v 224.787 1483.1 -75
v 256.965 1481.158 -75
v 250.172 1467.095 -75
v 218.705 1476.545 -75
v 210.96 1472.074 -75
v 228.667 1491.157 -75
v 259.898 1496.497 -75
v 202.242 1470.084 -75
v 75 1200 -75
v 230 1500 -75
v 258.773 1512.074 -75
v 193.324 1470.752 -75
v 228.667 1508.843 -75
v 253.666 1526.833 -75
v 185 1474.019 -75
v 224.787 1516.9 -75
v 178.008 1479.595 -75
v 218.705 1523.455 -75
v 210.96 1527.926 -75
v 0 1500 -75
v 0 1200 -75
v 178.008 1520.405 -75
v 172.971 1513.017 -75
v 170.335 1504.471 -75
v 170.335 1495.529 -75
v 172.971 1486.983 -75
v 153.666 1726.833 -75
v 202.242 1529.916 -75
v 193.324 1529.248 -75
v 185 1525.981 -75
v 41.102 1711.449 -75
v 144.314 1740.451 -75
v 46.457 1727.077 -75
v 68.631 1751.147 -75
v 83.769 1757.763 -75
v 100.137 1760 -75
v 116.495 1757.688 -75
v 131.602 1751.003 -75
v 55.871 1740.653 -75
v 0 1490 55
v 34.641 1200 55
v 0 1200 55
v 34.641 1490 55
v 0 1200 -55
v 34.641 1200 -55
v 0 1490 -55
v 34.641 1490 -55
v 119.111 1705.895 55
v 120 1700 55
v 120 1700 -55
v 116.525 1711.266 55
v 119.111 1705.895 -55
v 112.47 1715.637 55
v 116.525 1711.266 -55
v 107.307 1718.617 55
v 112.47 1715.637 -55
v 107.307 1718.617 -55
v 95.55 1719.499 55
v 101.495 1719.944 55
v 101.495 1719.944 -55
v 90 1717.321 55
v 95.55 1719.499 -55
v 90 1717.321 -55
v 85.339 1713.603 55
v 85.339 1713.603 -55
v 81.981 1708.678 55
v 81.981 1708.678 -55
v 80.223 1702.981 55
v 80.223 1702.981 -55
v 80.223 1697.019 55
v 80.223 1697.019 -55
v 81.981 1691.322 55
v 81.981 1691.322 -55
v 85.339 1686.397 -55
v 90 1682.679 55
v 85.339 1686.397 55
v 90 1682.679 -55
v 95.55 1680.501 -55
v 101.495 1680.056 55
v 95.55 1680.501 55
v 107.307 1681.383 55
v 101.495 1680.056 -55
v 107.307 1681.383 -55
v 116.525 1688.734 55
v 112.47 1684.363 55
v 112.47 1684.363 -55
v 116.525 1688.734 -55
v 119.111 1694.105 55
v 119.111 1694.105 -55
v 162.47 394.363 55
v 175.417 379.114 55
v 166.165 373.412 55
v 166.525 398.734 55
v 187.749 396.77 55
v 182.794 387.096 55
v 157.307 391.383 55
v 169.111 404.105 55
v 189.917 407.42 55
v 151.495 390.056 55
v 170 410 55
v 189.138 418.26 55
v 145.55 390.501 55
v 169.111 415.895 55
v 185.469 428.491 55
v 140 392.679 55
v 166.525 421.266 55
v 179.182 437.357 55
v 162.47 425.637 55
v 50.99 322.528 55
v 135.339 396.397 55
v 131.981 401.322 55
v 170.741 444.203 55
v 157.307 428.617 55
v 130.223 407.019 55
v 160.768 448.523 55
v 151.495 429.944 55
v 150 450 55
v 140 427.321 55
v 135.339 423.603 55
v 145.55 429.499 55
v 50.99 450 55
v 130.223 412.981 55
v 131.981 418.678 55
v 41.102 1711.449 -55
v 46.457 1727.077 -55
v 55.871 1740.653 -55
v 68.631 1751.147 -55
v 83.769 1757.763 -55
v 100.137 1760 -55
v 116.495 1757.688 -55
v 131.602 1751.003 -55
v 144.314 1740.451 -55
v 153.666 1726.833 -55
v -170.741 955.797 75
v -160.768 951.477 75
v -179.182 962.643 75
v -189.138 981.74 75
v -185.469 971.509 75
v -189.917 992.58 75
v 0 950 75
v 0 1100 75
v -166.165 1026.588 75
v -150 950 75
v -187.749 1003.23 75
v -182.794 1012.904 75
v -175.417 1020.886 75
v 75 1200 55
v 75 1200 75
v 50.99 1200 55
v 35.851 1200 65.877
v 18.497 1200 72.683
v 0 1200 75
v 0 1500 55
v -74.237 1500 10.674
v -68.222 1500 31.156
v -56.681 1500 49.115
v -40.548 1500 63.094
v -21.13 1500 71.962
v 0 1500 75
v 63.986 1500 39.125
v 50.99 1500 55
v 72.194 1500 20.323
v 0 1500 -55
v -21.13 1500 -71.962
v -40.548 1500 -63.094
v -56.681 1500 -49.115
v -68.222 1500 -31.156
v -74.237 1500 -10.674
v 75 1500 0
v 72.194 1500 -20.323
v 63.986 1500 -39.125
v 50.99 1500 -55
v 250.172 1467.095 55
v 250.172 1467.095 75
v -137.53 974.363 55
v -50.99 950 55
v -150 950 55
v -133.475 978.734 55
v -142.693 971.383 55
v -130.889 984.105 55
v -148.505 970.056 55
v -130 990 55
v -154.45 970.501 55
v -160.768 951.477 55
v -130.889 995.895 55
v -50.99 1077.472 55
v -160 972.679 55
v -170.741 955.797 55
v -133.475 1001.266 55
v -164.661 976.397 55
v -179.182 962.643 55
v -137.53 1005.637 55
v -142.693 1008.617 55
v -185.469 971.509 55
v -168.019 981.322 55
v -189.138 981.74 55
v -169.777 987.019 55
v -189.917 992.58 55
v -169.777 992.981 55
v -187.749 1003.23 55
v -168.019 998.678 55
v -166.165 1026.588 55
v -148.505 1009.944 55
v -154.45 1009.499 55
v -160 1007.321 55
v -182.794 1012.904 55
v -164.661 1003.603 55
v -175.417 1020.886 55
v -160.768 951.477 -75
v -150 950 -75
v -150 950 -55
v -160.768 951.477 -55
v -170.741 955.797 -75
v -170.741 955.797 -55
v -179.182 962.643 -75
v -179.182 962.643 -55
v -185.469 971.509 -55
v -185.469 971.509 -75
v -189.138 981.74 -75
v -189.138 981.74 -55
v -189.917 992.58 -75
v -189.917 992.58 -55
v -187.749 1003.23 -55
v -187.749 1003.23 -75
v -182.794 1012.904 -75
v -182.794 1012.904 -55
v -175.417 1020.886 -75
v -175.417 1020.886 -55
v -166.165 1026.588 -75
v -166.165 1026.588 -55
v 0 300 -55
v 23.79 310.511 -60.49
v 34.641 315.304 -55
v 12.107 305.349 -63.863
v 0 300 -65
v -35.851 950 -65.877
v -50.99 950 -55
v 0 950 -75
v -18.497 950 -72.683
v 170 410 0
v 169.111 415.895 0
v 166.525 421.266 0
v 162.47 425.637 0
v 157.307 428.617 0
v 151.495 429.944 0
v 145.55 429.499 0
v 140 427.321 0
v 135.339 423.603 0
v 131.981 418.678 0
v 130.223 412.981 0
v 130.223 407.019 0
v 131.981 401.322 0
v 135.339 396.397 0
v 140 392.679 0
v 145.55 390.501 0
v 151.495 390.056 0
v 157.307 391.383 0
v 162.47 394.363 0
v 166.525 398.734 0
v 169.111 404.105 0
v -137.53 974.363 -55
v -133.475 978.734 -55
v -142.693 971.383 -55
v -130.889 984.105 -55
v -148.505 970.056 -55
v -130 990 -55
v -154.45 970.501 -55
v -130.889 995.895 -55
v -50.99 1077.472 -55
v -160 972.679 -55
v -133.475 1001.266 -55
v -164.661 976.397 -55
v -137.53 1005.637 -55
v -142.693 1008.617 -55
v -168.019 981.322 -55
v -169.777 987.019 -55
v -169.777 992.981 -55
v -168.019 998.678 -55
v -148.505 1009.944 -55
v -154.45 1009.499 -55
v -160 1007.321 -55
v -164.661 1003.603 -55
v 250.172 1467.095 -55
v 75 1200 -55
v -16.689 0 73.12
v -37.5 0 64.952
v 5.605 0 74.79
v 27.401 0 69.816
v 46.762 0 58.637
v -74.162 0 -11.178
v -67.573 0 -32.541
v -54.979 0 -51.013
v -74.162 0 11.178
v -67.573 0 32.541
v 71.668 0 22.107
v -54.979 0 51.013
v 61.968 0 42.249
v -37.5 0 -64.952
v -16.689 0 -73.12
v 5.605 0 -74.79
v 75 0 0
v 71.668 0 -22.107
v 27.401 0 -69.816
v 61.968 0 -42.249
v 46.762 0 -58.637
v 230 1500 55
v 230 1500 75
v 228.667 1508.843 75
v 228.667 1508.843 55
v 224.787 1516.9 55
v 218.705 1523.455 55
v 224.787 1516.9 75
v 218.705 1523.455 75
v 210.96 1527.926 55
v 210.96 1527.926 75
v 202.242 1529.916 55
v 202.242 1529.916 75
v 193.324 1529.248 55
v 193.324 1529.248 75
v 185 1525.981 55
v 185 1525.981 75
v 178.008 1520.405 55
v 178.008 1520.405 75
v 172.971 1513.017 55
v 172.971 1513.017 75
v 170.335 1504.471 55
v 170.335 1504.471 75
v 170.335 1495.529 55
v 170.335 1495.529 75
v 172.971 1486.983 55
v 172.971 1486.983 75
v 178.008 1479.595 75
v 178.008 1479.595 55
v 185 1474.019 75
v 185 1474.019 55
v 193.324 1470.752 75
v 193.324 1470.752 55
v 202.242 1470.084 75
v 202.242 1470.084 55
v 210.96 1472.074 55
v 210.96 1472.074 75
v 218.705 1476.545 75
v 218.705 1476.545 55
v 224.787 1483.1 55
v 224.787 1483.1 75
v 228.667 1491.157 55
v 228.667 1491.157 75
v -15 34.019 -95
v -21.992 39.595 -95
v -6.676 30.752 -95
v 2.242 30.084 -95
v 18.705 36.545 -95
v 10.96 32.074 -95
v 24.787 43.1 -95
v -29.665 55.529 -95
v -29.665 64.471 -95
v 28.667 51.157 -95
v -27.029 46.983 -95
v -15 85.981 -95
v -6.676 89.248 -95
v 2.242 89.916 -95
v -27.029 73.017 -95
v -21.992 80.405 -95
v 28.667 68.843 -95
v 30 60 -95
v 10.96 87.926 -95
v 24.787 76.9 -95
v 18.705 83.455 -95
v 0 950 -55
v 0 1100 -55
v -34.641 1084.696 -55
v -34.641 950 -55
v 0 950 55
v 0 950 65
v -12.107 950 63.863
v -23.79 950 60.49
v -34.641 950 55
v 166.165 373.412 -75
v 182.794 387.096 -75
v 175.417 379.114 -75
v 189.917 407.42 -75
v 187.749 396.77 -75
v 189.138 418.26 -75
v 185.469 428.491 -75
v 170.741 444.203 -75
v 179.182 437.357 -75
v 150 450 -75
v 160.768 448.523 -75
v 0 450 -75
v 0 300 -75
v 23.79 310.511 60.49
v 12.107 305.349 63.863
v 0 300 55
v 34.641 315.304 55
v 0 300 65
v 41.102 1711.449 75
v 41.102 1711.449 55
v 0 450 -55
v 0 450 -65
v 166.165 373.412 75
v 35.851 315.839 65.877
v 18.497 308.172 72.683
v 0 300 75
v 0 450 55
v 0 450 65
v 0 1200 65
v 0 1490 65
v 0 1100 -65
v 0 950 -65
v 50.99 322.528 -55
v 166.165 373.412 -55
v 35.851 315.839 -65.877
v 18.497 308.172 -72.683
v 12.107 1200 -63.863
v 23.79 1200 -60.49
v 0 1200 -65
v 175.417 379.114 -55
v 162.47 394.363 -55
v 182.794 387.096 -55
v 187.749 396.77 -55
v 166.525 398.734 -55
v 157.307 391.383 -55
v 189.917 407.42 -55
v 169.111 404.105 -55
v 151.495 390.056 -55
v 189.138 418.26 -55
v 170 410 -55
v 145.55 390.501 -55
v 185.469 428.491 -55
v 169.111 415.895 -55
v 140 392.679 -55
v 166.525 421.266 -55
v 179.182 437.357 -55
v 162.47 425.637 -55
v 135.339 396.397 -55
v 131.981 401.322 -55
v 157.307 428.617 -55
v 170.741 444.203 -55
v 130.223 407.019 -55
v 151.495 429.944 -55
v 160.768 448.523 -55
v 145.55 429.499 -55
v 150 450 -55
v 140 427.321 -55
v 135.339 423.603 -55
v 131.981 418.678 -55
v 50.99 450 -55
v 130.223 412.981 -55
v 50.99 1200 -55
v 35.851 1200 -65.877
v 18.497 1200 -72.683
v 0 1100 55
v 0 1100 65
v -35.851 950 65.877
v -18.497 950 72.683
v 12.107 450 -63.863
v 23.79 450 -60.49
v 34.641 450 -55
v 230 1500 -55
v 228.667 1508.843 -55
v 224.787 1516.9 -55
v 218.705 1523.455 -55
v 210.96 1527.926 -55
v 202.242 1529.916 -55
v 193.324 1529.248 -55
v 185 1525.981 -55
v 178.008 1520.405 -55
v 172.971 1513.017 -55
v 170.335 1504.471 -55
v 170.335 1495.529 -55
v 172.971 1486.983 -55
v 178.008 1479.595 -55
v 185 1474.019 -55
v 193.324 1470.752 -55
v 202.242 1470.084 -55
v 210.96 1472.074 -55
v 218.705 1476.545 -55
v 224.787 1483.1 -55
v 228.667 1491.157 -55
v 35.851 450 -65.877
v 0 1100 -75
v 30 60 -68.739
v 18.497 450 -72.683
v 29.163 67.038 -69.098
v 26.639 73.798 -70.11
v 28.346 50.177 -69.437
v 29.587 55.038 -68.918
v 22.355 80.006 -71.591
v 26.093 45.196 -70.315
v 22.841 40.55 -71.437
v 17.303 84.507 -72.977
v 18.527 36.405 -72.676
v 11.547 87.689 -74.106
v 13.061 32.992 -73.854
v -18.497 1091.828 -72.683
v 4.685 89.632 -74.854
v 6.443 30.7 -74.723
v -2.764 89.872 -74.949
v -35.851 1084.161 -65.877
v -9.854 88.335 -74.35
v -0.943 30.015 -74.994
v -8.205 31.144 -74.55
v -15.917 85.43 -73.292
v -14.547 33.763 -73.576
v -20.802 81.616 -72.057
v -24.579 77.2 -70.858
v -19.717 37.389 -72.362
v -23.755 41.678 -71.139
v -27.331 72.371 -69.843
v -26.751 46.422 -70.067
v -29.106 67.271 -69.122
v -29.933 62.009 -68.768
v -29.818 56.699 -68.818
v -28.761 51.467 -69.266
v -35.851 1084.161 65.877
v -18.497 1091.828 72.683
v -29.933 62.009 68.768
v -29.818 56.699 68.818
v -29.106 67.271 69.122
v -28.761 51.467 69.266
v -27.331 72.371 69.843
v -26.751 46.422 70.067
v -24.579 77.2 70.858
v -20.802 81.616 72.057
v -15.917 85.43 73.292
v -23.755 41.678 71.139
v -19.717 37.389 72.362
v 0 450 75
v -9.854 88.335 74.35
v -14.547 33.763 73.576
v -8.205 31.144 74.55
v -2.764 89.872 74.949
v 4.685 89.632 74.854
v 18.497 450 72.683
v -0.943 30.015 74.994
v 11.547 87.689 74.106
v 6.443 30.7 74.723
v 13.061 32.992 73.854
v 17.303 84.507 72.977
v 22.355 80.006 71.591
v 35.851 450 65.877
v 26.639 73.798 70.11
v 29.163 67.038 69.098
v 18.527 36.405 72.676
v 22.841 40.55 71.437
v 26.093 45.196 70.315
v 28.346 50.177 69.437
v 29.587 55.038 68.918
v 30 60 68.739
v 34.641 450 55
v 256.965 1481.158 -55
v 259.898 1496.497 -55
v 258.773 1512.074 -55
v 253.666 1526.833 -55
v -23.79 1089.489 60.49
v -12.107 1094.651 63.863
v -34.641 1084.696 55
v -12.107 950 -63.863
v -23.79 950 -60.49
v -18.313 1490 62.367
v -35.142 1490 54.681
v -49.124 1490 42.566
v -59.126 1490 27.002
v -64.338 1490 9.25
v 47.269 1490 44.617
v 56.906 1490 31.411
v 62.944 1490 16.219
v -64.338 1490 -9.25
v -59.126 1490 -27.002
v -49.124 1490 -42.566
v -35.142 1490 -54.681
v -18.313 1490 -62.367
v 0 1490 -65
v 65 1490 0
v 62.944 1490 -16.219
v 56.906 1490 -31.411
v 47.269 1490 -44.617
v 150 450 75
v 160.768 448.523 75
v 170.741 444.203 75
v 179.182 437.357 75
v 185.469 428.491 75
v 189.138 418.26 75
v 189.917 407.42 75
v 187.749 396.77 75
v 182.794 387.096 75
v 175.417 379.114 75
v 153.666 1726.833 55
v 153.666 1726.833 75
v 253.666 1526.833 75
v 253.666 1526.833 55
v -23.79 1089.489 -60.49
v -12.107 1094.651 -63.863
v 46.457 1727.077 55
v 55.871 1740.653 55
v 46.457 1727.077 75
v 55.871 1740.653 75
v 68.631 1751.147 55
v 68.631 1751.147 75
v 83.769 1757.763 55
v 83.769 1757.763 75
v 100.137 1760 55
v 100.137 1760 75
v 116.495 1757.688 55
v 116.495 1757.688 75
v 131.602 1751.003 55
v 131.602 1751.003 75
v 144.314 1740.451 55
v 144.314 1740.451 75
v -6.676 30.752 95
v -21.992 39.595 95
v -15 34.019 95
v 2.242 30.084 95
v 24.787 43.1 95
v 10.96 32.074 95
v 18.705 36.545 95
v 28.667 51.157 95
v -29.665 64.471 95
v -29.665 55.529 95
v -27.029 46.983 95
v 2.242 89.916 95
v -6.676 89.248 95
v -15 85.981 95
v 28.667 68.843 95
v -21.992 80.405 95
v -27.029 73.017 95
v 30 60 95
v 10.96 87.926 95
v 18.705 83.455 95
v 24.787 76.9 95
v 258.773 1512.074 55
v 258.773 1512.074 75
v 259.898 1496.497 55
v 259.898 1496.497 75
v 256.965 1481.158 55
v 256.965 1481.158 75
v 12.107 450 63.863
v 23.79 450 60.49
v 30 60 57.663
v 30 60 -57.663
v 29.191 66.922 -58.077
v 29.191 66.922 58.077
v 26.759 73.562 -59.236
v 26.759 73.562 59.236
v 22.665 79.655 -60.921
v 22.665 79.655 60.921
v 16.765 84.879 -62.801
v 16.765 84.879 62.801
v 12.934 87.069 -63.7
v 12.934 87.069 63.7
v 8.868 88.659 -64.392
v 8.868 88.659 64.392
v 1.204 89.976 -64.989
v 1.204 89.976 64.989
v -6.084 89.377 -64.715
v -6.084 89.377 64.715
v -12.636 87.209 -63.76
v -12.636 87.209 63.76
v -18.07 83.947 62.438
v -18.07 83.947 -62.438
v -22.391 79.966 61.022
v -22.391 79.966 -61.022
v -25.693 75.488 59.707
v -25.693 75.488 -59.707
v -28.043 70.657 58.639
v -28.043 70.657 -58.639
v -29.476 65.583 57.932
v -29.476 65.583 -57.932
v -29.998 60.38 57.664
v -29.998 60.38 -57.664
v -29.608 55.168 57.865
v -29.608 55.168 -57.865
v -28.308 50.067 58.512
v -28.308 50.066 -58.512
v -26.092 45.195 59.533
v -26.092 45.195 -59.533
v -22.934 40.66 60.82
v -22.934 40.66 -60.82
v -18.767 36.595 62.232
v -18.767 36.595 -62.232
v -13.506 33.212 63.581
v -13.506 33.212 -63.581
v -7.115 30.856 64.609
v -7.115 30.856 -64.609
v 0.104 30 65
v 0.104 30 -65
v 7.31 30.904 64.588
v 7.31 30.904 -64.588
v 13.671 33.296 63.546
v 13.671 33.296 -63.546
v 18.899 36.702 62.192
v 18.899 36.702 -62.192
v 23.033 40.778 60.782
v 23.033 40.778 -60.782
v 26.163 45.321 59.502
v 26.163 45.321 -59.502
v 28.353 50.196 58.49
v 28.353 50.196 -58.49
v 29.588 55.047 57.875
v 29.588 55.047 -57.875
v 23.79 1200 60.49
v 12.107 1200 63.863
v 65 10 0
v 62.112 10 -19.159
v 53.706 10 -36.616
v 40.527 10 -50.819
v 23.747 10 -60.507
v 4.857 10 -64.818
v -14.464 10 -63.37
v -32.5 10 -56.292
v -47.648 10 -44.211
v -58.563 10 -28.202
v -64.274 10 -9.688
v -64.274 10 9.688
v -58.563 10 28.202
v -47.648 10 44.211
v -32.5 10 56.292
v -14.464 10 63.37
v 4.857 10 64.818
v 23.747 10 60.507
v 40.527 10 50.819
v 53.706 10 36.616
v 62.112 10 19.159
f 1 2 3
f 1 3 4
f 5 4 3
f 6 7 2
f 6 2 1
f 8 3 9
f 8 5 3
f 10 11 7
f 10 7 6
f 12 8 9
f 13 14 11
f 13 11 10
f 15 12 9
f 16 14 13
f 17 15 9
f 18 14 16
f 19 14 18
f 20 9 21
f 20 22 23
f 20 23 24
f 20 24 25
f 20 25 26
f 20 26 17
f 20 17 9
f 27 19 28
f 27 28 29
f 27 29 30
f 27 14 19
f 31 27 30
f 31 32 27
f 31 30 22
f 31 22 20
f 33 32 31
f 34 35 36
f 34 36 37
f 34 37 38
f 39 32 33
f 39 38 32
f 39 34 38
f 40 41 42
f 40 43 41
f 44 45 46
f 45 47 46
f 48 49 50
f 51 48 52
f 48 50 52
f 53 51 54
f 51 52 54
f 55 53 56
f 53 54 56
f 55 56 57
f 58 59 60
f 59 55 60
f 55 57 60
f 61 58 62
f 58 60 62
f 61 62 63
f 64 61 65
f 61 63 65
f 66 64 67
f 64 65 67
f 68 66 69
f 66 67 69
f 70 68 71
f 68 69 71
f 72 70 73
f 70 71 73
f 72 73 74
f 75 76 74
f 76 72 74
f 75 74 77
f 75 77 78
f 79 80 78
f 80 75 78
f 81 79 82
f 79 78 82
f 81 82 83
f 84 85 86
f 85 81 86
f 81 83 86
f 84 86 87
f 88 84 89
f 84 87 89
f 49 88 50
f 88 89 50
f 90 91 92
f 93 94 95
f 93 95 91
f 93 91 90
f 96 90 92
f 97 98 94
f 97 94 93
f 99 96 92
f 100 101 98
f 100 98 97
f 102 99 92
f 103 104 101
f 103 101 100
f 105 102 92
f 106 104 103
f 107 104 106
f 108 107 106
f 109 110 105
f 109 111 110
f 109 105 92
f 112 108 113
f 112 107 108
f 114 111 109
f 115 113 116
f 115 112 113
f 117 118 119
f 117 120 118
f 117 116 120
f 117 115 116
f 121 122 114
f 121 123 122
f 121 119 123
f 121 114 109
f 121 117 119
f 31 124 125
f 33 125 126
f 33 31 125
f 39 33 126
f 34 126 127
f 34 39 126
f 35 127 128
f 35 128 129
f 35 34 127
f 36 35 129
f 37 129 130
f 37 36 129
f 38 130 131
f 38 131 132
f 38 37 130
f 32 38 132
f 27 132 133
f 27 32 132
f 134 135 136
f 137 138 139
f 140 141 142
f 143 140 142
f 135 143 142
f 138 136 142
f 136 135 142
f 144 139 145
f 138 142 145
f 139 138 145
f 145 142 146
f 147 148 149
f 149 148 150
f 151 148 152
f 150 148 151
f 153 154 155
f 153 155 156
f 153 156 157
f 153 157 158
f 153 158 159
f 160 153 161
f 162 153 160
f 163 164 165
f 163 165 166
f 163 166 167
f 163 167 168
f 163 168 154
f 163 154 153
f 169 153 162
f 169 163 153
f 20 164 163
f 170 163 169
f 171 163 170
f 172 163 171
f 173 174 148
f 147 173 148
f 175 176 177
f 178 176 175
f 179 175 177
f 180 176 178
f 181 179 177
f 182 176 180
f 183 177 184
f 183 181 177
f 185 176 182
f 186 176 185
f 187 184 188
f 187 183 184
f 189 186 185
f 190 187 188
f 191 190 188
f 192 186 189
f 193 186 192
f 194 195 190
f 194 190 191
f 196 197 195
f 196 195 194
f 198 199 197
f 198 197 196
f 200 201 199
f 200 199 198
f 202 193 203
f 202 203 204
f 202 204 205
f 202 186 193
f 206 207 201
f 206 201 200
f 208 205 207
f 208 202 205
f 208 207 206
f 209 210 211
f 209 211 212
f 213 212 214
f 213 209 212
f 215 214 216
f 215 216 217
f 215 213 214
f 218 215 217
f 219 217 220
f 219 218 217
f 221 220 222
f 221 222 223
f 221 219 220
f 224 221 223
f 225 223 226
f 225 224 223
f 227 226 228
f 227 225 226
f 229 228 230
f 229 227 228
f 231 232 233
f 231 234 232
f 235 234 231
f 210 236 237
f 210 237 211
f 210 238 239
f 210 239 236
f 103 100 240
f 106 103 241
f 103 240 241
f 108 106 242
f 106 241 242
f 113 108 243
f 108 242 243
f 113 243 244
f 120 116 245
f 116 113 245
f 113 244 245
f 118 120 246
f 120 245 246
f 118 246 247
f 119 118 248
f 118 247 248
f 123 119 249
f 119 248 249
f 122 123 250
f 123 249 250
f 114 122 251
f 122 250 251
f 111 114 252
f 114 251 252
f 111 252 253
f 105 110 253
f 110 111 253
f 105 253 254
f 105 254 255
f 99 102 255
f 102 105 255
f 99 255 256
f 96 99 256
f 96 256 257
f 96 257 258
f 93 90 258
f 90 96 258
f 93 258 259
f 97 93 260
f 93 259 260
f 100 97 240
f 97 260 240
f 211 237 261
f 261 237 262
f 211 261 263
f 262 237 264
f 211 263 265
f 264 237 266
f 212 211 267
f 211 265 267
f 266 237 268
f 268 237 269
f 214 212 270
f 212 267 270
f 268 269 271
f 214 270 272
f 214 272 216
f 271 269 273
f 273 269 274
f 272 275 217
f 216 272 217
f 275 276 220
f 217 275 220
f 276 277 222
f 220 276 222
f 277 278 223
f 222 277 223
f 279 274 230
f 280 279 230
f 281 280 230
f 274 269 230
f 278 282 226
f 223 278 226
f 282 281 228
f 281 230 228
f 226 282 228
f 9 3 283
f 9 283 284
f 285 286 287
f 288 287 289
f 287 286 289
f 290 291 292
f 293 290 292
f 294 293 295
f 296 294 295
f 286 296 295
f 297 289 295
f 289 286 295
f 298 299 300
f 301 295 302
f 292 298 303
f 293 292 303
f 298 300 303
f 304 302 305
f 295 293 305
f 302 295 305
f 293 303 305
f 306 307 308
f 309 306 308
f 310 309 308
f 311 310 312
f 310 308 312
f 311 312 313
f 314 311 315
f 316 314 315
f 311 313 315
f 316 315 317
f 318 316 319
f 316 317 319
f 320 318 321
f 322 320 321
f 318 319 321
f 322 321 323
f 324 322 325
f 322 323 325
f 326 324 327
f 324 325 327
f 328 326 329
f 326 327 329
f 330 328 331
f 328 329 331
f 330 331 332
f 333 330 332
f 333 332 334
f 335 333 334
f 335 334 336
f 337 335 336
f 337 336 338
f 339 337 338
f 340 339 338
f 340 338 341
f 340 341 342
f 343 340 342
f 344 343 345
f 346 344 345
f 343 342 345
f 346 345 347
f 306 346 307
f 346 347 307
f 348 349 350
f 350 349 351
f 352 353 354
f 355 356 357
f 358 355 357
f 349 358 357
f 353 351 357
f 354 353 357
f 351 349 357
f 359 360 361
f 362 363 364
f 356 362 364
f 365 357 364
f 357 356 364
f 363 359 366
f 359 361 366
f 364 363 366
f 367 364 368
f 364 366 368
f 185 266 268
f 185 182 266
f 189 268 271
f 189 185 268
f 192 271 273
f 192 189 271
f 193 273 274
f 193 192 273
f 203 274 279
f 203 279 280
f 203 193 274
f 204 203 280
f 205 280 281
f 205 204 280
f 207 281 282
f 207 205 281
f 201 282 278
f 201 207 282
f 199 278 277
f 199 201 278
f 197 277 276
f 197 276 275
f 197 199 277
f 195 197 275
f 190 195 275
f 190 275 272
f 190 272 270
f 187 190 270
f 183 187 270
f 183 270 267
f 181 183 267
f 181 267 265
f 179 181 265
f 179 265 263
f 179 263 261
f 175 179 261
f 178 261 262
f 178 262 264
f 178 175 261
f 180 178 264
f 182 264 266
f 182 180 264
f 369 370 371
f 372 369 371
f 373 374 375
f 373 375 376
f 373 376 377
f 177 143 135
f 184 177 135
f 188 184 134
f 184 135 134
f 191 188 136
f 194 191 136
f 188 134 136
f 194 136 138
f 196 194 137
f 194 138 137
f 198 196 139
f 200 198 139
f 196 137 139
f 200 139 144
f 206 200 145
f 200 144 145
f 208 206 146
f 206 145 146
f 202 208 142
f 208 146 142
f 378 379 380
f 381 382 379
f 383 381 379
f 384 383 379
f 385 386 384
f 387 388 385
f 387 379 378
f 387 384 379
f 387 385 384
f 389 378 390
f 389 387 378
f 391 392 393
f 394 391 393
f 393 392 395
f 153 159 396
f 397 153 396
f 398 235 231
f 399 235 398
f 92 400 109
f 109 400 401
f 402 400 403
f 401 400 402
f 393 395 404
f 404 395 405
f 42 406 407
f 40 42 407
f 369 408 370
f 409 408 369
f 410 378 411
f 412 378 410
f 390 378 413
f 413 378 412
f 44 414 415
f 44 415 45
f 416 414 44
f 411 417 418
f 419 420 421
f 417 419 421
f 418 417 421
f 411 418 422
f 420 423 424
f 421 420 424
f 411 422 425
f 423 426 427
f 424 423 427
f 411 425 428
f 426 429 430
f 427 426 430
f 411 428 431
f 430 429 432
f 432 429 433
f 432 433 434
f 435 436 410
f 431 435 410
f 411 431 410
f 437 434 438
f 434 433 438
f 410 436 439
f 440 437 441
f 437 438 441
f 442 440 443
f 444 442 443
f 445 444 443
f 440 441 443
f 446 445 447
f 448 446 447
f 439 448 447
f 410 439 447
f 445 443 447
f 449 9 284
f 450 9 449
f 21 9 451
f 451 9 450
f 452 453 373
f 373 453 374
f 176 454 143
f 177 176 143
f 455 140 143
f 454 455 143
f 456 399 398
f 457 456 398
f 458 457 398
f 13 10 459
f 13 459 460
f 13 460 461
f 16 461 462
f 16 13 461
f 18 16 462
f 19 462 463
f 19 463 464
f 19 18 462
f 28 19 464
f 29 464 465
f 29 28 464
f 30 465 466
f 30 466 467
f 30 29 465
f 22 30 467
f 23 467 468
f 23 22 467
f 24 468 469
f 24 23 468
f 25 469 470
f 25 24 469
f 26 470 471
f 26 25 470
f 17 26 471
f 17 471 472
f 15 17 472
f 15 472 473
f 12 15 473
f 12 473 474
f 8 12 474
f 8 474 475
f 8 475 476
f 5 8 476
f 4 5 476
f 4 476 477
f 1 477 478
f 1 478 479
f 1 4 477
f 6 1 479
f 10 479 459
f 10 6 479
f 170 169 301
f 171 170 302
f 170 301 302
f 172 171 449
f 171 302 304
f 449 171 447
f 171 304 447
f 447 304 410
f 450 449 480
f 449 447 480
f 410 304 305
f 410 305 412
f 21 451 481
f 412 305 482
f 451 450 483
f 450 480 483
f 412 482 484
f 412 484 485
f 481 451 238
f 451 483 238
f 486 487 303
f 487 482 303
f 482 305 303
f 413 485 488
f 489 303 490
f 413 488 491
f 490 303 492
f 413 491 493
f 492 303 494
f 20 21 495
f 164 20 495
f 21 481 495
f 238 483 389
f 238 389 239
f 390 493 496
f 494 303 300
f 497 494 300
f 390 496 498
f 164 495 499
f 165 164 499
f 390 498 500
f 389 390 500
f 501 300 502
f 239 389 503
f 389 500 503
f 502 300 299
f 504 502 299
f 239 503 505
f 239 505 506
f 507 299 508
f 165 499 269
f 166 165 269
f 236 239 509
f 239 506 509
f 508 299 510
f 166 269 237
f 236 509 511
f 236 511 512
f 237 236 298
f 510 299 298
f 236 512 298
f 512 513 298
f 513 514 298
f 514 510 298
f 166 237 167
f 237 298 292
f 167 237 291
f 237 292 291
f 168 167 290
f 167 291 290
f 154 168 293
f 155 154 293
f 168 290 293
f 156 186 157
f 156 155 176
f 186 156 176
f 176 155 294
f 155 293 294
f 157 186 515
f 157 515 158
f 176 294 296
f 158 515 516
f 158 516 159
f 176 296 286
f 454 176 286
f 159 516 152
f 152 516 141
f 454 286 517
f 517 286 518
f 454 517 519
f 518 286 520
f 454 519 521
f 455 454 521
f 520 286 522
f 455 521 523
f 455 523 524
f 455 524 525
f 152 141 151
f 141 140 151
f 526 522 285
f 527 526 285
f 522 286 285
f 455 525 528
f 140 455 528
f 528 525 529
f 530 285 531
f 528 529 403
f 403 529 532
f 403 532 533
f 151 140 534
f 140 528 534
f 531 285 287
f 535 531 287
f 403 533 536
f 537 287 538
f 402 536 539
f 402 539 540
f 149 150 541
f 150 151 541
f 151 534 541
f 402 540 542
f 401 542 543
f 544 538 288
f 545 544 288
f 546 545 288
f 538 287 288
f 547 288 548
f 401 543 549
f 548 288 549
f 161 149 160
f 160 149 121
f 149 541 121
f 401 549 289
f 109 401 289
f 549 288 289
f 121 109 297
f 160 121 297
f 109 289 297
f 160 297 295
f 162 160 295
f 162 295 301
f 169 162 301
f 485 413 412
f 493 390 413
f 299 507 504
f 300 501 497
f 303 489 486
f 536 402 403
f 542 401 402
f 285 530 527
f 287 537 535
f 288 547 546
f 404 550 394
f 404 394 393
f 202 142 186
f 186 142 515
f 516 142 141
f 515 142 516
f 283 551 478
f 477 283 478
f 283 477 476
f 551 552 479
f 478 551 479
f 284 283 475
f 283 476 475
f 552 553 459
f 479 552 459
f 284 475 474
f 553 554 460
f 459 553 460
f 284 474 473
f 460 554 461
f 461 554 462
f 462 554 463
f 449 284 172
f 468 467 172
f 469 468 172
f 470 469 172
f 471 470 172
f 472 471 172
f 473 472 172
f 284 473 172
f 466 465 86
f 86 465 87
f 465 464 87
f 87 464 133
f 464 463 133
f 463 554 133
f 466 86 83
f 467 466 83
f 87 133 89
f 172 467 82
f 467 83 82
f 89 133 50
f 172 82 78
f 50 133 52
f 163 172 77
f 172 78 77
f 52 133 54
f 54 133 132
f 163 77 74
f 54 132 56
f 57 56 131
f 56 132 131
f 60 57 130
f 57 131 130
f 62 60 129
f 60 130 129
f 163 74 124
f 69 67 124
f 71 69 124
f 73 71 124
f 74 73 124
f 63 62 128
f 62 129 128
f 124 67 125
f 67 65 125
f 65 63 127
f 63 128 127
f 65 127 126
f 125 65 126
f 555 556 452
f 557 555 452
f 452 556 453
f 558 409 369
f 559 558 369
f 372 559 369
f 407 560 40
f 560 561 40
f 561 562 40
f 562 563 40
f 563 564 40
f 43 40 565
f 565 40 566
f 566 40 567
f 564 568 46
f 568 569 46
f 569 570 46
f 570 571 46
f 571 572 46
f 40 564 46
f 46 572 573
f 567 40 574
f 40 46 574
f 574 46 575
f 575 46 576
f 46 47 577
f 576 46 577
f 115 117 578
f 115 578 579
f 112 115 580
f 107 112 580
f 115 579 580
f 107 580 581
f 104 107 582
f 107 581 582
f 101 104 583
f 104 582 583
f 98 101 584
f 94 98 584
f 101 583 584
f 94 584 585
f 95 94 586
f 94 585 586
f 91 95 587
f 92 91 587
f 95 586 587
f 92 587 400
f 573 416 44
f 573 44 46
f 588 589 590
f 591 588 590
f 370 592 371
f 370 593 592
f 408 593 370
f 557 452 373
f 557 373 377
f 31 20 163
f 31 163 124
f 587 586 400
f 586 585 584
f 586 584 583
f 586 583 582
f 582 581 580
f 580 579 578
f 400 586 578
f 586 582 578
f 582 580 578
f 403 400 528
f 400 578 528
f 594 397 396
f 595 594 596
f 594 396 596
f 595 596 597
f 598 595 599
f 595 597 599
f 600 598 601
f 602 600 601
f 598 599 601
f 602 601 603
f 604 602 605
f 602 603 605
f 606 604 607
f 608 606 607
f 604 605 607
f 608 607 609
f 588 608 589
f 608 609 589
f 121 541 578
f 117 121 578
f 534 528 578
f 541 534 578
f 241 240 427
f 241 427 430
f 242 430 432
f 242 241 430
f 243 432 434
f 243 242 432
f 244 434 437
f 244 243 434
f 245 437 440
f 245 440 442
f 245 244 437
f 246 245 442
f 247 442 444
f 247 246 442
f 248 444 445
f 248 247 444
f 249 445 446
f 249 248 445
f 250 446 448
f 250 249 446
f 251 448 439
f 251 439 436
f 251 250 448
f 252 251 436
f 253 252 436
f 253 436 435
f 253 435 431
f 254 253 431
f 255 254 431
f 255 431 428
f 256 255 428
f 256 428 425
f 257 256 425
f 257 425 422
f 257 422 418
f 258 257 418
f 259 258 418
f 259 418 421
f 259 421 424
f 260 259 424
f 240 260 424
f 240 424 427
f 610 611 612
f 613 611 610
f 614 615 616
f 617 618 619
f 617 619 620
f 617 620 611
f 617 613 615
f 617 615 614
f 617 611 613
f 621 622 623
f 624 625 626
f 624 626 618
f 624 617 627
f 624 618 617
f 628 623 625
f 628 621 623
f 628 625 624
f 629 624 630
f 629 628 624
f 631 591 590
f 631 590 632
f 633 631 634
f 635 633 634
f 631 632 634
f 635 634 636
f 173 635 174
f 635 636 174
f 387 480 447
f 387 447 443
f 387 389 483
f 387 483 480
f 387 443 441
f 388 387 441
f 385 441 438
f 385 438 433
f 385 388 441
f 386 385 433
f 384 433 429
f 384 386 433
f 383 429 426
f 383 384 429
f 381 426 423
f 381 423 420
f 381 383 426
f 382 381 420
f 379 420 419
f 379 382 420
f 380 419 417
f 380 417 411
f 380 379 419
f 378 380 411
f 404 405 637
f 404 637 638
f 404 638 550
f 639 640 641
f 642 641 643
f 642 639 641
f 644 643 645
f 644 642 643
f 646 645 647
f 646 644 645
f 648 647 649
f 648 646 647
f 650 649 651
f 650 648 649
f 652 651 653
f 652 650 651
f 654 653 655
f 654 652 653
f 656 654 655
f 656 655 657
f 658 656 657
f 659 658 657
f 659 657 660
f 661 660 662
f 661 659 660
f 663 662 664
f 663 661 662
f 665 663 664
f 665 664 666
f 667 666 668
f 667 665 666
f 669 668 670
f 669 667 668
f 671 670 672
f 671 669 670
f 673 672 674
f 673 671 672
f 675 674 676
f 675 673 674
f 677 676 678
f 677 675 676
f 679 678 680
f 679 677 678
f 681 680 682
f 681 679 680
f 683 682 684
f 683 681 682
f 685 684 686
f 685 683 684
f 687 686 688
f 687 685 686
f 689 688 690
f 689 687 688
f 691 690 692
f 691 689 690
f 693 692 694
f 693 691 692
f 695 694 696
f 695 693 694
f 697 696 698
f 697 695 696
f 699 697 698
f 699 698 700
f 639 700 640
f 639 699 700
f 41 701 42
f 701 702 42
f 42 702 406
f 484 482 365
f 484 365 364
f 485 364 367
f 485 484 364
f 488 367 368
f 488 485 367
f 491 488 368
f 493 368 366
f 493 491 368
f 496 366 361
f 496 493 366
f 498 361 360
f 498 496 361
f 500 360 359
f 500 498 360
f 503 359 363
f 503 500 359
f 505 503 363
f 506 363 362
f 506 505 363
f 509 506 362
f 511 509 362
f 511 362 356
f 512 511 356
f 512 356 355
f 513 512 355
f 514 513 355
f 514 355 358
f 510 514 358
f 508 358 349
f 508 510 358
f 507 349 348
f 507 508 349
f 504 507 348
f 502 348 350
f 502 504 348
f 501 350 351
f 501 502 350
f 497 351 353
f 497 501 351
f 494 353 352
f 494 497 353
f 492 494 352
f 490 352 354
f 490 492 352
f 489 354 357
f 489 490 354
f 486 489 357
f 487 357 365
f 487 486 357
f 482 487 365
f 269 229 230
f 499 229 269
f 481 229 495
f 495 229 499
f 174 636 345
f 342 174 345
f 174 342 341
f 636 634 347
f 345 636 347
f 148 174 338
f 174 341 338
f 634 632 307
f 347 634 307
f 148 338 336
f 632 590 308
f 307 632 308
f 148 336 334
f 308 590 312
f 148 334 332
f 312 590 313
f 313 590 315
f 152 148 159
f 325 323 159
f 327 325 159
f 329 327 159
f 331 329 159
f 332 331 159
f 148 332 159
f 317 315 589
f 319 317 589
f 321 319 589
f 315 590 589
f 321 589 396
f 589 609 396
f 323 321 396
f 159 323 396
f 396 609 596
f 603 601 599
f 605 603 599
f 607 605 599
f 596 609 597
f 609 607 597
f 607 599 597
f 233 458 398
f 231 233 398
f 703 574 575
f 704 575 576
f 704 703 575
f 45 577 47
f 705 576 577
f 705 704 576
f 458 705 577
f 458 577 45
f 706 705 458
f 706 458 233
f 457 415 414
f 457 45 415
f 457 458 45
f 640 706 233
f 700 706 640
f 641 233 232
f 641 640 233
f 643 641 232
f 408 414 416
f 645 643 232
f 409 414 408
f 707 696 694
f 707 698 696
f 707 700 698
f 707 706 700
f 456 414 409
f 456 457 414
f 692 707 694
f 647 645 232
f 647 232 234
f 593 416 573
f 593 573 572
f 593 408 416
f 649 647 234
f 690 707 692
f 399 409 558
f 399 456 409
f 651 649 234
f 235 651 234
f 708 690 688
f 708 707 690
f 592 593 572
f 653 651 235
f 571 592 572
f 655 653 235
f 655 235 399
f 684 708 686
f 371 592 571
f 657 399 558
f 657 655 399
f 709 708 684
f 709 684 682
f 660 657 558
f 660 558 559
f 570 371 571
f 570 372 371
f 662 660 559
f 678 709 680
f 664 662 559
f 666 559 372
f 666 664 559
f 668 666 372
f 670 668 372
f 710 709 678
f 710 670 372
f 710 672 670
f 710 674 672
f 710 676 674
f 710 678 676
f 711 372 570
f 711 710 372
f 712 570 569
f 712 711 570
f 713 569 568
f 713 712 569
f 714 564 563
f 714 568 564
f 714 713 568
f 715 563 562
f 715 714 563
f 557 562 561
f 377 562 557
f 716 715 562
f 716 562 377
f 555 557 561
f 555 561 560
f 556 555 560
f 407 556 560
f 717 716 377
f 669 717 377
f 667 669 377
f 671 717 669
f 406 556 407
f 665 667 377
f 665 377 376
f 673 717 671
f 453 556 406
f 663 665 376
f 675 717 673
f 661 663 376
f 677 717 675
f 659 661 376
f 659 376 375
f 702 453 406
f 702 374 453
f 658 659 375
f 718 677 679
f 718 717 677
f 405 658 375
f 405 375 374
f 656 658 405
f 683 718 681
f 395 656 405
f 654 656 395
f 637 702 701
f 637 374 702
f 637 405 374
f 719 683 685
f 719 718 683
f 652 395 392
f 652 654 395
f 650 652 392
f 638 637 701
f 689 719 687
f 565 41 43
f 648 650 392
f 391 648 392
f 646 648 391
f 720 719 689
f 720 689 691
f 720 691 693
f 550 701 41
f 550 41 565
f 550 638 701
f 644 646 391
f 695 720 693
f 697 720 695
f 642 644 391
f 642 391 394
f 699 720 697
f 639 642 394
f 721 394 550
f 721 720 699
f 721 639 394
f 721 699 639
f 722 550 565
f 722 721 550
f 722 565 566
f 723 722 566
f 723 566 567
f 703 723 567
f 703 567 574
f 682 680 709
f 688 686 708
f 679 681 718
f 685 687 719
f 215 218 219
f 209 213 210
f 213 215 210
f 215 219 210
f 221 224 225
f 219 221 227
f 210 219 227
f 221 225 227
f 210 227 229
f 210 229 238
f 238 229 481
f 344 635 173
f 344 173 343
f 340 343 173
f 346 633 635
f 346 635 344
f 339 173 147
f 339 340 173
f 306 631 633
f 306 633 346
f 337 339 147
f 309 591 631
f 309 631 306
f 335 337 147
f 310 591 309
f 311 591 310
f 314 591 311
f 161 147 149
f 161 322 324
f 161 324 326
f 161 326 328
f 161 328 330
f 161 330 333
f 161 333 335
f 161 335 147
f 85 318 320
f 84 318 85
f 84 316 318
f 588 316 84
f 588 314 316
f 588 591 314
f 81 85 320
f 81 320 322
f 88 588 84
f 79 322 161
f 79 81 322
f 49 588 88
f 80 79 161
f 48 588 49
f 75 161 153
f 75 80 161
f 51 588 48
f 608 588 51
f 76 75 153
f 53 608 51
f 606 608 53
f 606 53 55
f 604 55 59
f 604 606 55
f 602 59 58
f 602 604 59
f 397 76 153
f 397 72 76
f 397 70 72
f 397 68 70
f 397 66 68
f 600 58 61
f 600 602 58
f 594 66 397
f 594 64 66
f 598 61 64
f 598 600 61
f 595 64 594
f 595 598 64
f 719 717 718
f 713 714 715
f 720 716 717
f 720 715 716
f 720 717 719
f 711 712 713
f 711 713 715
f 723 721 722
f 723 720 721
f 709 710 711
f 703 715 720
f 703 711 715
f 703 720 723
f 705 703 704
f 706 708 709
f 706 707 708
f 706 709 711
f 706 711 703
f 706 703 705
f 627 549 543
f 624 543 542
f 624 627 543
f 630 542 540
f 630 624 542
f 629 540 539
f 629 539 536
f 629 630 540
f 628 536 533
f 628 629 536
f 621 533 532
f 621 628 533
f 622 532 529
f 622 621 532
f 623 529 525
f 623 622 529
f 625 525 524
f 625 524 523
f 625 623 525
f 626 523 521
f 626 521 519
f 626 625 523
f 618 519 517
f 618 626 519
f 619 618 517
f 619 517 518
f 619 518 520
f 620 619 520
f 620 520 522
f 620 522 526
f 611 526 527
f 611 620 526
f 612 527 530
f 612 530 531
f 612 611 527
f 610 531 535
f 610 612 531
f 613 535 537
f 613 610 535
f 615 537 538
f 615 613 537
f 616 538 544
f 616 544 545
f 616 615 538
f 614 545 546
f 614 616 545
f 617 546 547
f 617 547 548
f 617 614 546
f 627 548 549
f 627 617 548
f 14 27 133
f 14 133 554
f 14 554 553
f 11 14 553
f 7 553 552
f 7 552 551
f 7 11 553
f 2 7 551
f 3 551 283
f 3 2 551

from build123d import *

# Parameters (mm, degrees)
SKETCH2_R           = 75
BOSS_EXTRUDE1_DEPTH = 1500
SHELL4_T            = 10
BOSS_EXTRUDE2_START = 75
SKETCH3_R           = 30
BOSS_EXTRUDE2_DEPTH = 20
SKETCH10_R          = 30
BOSS_EXTRUDE3_DEPTH = 95
SKETCH12_R          = 20
BOSS_EXTRUDE4_DEPTH = 75


with BuildPart() as part:
    # Sketch2 → Boss-Extrude1 (new body)
    with BuildSketch(Plane(origin=(0, 0, 0), x_dir=(1, 0, 0), z_dir=(0, 1, 0))):
        Circle(SKETCH2_R)
    extrude(amount=BOSS_EXTRUDE1_DEPTH)

    # Shell4 (no face opened: a closed hollow body)
    add(offset(amount=-SHELL4_T, mode=Mode.PRIVATE), mode=Mode.SUBTRACT)

    # Sketch3 → Boss-Extrude2 (add)
    with BuildSketch(Plane.XY.offset(BOSS_EXTRUDE2_START)):
        with BuildLine():
            Line((0, 450), (150, 450))
            ThreePointArc((150, 450), (189.137774485, 418.260424226), (166.164731025, 373.41173042))
            Line((166.164731025, 373.41173042), (0, 300))
            Line((0, 300), (0, 450))
        make_face()
        with BuildLine():
            Line((0, 1100), (0, 950))
            Line((0, 950), (-150, 950))
            ThreePointArc((-150, 950), (-189.137774485, 981.739575774), (-166.164731025, 1026.58826958))
            Line((-166.164731025, 1026.58826958), (0, 1100))
        make_face()
        with BuildLine():
            Line((0, 1200), (0, 1500))
            Line((0, 1500), (41.102417852, 1711.448791074))
            ThreePointArc((41.102417852, 1711.448791074), (91.875322735, 1759.447368481), (153.66563146, 1726.83281573))
            Line((153.66563146, 1726.83281573), (253.66563146, 1526.83281573))
            ThreePointArc((253.66563146, 1526.83281573), (259.897670219, 1496.497272164), (250.172245693, 1467.094897628))
            Line((250.172245693, 1467.094897628), (75, 1200))
            Line((75, 1200), (0, 1200))
        make_face()
        with Locations((200, 1500)):
            Circle(SKETCH3_R, mode=Mode.SUBTRACT)
    boss_extrude2 = extrude(amount=-BOSS_EXTRUDE2_DEPTH)

    # Mirror11: Boss-Extrude2 across plane
    add(boss_extrude2.mirror(Plane(origin=(0, 0, 0), x_dir=(1, 0, 0), z_dir=(0, 0, -1))))

    # Sketch10 → Boss-Extrude3 (add, symmetric)
    with BuildSketch(Plane.XY):
        with Locations((0, 60)):
            Circle(SKETCH10_R)
    extrude(amount=BOSS_EXTRUDE3_DEPTH, both=True)

    # Sketch12 → Boss-Extrude4 (add, symmetric)
    with BuildSketch(Plane.XY):
        with Locations((150, 410)):
            Circle(SKETCH12_R)
        with Locations((100, 1700)):
            Circle(SKETCH12_R)
        with Locations((-150, 990)):
            Circle(SKETCH12_R)
    extrude(amount=BOSS_EXTRUDE4_DEPTH, both=True)


solid = part.part
